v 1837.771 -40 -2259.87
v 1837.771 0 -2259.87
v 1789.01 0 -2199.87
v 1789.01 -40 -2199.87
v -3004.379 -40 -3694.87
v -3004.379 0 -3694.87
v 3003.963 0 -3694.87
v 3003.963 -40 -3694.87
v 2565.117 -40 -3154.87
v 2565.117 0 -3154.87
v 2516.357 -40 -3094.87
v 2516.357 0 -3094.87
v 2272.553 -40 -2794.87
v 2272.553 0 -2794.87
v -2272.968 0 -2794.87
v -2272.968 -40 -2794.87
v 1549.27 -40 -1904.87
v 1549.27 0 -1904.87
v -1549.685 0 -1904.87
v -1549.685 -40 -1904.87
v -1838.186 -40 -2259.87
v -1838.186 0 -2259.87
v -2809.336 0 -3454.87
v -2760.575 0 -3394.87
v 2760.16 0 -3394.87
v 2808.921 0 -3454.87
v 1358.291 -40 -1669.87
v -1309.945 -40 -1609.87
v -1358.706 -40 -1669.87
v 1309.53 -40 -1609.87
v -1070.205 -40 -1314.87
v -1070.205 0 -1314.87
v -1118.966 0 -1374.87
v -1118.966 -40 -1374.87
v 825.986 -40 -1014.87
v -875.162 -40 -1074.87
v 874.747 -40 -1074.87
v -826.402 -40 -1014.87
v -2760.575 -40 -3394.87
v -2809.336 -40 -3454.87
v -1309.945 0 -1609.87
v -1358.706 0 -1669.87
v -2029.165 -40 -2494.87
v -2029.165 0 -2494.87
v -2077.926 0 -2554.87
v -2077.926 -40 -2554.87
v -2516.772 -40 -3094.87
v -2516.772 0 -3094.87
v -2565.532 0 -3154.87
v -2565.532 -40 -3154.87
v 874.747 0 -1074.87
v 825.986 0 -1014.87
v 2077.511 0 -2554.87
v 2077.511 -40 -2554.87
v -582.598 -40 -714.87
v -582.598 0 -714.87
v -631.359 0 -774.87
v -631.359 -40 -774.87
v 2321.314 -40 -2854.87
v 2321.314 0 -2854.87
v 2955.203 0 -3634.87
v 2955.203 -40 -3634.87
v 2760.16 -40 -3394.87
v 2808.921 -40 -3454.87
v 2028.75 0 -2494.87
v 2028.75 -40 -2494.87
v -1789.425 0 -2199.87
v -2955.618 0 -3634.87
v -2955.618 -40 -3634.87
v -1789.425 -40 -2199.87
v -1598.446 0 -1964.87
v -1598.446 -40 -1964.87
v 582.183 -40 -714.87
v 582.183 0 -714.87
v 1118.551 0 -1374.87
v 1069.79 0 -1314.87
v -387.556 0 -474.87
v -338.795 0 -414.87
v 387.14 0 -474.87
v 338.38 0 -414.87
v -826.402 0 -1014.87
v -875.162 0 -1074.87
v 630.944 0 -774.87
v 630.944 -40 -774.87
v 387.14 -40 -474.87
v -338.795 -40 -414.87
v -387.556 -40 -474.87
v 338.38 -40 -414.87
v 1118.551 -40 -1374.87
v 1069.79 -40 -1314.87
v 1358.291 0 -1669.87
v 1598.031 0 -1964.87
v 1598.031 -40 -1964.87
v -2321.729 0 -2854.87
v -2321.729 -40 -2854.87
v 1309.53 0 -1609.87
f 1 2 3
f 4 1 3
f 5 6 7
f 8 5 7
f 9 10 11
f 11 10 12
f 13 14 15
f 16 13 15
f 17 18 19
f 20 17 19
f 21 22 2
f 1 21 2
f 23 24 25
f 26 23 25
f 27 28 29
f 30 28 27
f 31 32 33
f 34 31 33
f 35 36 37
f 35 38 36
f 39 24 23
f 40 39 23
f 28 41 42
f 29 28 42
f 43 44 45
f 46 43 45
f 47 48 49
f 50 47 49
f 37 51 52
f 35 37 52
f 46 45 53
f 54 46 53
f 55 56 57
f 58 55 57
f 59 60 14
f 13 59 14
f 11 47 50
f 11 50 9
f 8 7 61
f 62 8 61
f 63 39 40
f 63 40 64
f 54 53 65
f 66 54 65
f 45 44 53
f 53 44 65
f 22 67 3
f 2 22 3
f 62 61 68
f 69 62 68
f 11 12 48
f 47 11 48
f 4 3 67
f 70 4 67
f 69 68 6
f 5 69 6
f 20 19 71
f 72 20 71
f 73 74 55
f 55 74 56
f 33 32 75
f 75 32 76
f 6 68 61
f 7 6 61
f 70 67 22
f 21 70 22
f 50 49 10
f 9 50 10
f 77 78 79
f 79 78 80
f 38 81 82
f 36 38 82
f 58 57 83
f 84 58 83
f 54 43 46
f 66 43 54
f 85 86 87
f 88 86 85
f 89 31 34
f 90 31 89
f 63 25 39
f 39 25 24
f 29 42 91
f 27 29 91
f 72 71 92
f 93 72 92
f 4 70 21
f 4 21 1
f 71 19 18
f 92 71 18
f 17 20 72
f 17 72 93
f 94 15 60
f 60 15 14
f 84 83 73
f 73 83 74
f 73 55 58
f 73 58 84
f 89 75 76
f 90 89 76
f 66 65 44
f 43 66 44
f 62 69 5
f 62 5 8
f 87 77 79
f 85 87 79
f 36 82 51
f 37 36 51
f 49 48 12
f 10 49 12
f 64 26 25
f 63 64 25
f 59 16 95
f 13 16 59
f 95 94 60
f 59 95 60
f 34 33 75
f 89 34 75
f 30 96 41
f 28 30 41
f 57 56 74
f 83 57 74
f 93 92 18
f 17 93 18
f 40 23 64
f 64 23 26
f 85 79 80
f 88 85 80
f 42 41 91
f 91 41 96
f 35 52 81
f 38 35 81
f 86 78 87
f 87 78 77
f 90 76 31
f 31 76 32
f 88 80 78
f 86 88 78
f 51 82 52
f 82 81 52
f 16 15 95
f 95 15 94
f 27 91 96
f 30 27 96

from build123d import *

# Parameters (mm, degrees)
F1_DEPTH = 40


with BuildPart() as f1:
    # F0 (on Front) → F1 (new body)
    with BuildSketch(Plane.XZ):
        Polygon((-338.794827, -414.870203), (-387.555505, -474.870203), (387.140356, -474.870203), (338.379679, -414.870203), (-0.207632, -414.870203), align=None)
        Polygon((630.943743, -774.870203), (582.183065, -714.870203), (-582.598214, -714.870203), (-631.358891, -774.870203), align=None)
        Polygon((-875.162278, -1074.870203), (874.747129, -1074.870203), (825.986452, -1014.870203), (-826.401601, -1014.870203), align=None)
        Polygon((1118.550516, -1374.870203), (1069.789839, -1314.870203), (-1070.204987, -1314.870203), (-1118.965665, -1374.870203), align=None)
        Polygon((1309.529836, -1609.870203), (-1309.944984, -1609.870203), (-1358.705662, -1669.870203), (1358.290513, -1669.870203), align=None)
        Polygon((-1549.684981, -1904.870203), (-1598.445658, -1964.870203), (1598.03051, -1964.870203), (1549.269832, -1904.870203), align=None)
        Polygon((1789.009829, -2199.870203), (-1789.424978, -2199.870203), (-1838.185655, -2259.870203), (1837.770507, -2259.870203), align=None)
        Polygon((2272.553213, -2794.870203), (-2272.968361, -2794.870203), (-2321.729039, -2854.870203), (2321.31389, -2854.870203), align=None)
        Polygon((2516.356599, -3094.870203), (-2516.771748, -3094.870203), (-2565.532425, -3154.870203), (2565.117277, -3154.870203), align=None)
        Polygon((2028.749826, -2494.870203), (-2029.164975, -2494.870203), (-2077.925652, -2554.870203), (2077.510503, -2554.870203), align=None)
        Polygon((2760.159986, -3394.870203), (-2760.575135, -3394.870203), (-2809.335812, -3454.870203), (2808.920663, -3454.870203), align=None)
        Polygon((2955.202695, -3634.870203), (-2955.617844, -3634.870203), (-3004.378521, -3694.870203), (3003.963373, -3694.870203), align=None)
    extrude(amount=F1_DEPTH)


solid = f1.part
